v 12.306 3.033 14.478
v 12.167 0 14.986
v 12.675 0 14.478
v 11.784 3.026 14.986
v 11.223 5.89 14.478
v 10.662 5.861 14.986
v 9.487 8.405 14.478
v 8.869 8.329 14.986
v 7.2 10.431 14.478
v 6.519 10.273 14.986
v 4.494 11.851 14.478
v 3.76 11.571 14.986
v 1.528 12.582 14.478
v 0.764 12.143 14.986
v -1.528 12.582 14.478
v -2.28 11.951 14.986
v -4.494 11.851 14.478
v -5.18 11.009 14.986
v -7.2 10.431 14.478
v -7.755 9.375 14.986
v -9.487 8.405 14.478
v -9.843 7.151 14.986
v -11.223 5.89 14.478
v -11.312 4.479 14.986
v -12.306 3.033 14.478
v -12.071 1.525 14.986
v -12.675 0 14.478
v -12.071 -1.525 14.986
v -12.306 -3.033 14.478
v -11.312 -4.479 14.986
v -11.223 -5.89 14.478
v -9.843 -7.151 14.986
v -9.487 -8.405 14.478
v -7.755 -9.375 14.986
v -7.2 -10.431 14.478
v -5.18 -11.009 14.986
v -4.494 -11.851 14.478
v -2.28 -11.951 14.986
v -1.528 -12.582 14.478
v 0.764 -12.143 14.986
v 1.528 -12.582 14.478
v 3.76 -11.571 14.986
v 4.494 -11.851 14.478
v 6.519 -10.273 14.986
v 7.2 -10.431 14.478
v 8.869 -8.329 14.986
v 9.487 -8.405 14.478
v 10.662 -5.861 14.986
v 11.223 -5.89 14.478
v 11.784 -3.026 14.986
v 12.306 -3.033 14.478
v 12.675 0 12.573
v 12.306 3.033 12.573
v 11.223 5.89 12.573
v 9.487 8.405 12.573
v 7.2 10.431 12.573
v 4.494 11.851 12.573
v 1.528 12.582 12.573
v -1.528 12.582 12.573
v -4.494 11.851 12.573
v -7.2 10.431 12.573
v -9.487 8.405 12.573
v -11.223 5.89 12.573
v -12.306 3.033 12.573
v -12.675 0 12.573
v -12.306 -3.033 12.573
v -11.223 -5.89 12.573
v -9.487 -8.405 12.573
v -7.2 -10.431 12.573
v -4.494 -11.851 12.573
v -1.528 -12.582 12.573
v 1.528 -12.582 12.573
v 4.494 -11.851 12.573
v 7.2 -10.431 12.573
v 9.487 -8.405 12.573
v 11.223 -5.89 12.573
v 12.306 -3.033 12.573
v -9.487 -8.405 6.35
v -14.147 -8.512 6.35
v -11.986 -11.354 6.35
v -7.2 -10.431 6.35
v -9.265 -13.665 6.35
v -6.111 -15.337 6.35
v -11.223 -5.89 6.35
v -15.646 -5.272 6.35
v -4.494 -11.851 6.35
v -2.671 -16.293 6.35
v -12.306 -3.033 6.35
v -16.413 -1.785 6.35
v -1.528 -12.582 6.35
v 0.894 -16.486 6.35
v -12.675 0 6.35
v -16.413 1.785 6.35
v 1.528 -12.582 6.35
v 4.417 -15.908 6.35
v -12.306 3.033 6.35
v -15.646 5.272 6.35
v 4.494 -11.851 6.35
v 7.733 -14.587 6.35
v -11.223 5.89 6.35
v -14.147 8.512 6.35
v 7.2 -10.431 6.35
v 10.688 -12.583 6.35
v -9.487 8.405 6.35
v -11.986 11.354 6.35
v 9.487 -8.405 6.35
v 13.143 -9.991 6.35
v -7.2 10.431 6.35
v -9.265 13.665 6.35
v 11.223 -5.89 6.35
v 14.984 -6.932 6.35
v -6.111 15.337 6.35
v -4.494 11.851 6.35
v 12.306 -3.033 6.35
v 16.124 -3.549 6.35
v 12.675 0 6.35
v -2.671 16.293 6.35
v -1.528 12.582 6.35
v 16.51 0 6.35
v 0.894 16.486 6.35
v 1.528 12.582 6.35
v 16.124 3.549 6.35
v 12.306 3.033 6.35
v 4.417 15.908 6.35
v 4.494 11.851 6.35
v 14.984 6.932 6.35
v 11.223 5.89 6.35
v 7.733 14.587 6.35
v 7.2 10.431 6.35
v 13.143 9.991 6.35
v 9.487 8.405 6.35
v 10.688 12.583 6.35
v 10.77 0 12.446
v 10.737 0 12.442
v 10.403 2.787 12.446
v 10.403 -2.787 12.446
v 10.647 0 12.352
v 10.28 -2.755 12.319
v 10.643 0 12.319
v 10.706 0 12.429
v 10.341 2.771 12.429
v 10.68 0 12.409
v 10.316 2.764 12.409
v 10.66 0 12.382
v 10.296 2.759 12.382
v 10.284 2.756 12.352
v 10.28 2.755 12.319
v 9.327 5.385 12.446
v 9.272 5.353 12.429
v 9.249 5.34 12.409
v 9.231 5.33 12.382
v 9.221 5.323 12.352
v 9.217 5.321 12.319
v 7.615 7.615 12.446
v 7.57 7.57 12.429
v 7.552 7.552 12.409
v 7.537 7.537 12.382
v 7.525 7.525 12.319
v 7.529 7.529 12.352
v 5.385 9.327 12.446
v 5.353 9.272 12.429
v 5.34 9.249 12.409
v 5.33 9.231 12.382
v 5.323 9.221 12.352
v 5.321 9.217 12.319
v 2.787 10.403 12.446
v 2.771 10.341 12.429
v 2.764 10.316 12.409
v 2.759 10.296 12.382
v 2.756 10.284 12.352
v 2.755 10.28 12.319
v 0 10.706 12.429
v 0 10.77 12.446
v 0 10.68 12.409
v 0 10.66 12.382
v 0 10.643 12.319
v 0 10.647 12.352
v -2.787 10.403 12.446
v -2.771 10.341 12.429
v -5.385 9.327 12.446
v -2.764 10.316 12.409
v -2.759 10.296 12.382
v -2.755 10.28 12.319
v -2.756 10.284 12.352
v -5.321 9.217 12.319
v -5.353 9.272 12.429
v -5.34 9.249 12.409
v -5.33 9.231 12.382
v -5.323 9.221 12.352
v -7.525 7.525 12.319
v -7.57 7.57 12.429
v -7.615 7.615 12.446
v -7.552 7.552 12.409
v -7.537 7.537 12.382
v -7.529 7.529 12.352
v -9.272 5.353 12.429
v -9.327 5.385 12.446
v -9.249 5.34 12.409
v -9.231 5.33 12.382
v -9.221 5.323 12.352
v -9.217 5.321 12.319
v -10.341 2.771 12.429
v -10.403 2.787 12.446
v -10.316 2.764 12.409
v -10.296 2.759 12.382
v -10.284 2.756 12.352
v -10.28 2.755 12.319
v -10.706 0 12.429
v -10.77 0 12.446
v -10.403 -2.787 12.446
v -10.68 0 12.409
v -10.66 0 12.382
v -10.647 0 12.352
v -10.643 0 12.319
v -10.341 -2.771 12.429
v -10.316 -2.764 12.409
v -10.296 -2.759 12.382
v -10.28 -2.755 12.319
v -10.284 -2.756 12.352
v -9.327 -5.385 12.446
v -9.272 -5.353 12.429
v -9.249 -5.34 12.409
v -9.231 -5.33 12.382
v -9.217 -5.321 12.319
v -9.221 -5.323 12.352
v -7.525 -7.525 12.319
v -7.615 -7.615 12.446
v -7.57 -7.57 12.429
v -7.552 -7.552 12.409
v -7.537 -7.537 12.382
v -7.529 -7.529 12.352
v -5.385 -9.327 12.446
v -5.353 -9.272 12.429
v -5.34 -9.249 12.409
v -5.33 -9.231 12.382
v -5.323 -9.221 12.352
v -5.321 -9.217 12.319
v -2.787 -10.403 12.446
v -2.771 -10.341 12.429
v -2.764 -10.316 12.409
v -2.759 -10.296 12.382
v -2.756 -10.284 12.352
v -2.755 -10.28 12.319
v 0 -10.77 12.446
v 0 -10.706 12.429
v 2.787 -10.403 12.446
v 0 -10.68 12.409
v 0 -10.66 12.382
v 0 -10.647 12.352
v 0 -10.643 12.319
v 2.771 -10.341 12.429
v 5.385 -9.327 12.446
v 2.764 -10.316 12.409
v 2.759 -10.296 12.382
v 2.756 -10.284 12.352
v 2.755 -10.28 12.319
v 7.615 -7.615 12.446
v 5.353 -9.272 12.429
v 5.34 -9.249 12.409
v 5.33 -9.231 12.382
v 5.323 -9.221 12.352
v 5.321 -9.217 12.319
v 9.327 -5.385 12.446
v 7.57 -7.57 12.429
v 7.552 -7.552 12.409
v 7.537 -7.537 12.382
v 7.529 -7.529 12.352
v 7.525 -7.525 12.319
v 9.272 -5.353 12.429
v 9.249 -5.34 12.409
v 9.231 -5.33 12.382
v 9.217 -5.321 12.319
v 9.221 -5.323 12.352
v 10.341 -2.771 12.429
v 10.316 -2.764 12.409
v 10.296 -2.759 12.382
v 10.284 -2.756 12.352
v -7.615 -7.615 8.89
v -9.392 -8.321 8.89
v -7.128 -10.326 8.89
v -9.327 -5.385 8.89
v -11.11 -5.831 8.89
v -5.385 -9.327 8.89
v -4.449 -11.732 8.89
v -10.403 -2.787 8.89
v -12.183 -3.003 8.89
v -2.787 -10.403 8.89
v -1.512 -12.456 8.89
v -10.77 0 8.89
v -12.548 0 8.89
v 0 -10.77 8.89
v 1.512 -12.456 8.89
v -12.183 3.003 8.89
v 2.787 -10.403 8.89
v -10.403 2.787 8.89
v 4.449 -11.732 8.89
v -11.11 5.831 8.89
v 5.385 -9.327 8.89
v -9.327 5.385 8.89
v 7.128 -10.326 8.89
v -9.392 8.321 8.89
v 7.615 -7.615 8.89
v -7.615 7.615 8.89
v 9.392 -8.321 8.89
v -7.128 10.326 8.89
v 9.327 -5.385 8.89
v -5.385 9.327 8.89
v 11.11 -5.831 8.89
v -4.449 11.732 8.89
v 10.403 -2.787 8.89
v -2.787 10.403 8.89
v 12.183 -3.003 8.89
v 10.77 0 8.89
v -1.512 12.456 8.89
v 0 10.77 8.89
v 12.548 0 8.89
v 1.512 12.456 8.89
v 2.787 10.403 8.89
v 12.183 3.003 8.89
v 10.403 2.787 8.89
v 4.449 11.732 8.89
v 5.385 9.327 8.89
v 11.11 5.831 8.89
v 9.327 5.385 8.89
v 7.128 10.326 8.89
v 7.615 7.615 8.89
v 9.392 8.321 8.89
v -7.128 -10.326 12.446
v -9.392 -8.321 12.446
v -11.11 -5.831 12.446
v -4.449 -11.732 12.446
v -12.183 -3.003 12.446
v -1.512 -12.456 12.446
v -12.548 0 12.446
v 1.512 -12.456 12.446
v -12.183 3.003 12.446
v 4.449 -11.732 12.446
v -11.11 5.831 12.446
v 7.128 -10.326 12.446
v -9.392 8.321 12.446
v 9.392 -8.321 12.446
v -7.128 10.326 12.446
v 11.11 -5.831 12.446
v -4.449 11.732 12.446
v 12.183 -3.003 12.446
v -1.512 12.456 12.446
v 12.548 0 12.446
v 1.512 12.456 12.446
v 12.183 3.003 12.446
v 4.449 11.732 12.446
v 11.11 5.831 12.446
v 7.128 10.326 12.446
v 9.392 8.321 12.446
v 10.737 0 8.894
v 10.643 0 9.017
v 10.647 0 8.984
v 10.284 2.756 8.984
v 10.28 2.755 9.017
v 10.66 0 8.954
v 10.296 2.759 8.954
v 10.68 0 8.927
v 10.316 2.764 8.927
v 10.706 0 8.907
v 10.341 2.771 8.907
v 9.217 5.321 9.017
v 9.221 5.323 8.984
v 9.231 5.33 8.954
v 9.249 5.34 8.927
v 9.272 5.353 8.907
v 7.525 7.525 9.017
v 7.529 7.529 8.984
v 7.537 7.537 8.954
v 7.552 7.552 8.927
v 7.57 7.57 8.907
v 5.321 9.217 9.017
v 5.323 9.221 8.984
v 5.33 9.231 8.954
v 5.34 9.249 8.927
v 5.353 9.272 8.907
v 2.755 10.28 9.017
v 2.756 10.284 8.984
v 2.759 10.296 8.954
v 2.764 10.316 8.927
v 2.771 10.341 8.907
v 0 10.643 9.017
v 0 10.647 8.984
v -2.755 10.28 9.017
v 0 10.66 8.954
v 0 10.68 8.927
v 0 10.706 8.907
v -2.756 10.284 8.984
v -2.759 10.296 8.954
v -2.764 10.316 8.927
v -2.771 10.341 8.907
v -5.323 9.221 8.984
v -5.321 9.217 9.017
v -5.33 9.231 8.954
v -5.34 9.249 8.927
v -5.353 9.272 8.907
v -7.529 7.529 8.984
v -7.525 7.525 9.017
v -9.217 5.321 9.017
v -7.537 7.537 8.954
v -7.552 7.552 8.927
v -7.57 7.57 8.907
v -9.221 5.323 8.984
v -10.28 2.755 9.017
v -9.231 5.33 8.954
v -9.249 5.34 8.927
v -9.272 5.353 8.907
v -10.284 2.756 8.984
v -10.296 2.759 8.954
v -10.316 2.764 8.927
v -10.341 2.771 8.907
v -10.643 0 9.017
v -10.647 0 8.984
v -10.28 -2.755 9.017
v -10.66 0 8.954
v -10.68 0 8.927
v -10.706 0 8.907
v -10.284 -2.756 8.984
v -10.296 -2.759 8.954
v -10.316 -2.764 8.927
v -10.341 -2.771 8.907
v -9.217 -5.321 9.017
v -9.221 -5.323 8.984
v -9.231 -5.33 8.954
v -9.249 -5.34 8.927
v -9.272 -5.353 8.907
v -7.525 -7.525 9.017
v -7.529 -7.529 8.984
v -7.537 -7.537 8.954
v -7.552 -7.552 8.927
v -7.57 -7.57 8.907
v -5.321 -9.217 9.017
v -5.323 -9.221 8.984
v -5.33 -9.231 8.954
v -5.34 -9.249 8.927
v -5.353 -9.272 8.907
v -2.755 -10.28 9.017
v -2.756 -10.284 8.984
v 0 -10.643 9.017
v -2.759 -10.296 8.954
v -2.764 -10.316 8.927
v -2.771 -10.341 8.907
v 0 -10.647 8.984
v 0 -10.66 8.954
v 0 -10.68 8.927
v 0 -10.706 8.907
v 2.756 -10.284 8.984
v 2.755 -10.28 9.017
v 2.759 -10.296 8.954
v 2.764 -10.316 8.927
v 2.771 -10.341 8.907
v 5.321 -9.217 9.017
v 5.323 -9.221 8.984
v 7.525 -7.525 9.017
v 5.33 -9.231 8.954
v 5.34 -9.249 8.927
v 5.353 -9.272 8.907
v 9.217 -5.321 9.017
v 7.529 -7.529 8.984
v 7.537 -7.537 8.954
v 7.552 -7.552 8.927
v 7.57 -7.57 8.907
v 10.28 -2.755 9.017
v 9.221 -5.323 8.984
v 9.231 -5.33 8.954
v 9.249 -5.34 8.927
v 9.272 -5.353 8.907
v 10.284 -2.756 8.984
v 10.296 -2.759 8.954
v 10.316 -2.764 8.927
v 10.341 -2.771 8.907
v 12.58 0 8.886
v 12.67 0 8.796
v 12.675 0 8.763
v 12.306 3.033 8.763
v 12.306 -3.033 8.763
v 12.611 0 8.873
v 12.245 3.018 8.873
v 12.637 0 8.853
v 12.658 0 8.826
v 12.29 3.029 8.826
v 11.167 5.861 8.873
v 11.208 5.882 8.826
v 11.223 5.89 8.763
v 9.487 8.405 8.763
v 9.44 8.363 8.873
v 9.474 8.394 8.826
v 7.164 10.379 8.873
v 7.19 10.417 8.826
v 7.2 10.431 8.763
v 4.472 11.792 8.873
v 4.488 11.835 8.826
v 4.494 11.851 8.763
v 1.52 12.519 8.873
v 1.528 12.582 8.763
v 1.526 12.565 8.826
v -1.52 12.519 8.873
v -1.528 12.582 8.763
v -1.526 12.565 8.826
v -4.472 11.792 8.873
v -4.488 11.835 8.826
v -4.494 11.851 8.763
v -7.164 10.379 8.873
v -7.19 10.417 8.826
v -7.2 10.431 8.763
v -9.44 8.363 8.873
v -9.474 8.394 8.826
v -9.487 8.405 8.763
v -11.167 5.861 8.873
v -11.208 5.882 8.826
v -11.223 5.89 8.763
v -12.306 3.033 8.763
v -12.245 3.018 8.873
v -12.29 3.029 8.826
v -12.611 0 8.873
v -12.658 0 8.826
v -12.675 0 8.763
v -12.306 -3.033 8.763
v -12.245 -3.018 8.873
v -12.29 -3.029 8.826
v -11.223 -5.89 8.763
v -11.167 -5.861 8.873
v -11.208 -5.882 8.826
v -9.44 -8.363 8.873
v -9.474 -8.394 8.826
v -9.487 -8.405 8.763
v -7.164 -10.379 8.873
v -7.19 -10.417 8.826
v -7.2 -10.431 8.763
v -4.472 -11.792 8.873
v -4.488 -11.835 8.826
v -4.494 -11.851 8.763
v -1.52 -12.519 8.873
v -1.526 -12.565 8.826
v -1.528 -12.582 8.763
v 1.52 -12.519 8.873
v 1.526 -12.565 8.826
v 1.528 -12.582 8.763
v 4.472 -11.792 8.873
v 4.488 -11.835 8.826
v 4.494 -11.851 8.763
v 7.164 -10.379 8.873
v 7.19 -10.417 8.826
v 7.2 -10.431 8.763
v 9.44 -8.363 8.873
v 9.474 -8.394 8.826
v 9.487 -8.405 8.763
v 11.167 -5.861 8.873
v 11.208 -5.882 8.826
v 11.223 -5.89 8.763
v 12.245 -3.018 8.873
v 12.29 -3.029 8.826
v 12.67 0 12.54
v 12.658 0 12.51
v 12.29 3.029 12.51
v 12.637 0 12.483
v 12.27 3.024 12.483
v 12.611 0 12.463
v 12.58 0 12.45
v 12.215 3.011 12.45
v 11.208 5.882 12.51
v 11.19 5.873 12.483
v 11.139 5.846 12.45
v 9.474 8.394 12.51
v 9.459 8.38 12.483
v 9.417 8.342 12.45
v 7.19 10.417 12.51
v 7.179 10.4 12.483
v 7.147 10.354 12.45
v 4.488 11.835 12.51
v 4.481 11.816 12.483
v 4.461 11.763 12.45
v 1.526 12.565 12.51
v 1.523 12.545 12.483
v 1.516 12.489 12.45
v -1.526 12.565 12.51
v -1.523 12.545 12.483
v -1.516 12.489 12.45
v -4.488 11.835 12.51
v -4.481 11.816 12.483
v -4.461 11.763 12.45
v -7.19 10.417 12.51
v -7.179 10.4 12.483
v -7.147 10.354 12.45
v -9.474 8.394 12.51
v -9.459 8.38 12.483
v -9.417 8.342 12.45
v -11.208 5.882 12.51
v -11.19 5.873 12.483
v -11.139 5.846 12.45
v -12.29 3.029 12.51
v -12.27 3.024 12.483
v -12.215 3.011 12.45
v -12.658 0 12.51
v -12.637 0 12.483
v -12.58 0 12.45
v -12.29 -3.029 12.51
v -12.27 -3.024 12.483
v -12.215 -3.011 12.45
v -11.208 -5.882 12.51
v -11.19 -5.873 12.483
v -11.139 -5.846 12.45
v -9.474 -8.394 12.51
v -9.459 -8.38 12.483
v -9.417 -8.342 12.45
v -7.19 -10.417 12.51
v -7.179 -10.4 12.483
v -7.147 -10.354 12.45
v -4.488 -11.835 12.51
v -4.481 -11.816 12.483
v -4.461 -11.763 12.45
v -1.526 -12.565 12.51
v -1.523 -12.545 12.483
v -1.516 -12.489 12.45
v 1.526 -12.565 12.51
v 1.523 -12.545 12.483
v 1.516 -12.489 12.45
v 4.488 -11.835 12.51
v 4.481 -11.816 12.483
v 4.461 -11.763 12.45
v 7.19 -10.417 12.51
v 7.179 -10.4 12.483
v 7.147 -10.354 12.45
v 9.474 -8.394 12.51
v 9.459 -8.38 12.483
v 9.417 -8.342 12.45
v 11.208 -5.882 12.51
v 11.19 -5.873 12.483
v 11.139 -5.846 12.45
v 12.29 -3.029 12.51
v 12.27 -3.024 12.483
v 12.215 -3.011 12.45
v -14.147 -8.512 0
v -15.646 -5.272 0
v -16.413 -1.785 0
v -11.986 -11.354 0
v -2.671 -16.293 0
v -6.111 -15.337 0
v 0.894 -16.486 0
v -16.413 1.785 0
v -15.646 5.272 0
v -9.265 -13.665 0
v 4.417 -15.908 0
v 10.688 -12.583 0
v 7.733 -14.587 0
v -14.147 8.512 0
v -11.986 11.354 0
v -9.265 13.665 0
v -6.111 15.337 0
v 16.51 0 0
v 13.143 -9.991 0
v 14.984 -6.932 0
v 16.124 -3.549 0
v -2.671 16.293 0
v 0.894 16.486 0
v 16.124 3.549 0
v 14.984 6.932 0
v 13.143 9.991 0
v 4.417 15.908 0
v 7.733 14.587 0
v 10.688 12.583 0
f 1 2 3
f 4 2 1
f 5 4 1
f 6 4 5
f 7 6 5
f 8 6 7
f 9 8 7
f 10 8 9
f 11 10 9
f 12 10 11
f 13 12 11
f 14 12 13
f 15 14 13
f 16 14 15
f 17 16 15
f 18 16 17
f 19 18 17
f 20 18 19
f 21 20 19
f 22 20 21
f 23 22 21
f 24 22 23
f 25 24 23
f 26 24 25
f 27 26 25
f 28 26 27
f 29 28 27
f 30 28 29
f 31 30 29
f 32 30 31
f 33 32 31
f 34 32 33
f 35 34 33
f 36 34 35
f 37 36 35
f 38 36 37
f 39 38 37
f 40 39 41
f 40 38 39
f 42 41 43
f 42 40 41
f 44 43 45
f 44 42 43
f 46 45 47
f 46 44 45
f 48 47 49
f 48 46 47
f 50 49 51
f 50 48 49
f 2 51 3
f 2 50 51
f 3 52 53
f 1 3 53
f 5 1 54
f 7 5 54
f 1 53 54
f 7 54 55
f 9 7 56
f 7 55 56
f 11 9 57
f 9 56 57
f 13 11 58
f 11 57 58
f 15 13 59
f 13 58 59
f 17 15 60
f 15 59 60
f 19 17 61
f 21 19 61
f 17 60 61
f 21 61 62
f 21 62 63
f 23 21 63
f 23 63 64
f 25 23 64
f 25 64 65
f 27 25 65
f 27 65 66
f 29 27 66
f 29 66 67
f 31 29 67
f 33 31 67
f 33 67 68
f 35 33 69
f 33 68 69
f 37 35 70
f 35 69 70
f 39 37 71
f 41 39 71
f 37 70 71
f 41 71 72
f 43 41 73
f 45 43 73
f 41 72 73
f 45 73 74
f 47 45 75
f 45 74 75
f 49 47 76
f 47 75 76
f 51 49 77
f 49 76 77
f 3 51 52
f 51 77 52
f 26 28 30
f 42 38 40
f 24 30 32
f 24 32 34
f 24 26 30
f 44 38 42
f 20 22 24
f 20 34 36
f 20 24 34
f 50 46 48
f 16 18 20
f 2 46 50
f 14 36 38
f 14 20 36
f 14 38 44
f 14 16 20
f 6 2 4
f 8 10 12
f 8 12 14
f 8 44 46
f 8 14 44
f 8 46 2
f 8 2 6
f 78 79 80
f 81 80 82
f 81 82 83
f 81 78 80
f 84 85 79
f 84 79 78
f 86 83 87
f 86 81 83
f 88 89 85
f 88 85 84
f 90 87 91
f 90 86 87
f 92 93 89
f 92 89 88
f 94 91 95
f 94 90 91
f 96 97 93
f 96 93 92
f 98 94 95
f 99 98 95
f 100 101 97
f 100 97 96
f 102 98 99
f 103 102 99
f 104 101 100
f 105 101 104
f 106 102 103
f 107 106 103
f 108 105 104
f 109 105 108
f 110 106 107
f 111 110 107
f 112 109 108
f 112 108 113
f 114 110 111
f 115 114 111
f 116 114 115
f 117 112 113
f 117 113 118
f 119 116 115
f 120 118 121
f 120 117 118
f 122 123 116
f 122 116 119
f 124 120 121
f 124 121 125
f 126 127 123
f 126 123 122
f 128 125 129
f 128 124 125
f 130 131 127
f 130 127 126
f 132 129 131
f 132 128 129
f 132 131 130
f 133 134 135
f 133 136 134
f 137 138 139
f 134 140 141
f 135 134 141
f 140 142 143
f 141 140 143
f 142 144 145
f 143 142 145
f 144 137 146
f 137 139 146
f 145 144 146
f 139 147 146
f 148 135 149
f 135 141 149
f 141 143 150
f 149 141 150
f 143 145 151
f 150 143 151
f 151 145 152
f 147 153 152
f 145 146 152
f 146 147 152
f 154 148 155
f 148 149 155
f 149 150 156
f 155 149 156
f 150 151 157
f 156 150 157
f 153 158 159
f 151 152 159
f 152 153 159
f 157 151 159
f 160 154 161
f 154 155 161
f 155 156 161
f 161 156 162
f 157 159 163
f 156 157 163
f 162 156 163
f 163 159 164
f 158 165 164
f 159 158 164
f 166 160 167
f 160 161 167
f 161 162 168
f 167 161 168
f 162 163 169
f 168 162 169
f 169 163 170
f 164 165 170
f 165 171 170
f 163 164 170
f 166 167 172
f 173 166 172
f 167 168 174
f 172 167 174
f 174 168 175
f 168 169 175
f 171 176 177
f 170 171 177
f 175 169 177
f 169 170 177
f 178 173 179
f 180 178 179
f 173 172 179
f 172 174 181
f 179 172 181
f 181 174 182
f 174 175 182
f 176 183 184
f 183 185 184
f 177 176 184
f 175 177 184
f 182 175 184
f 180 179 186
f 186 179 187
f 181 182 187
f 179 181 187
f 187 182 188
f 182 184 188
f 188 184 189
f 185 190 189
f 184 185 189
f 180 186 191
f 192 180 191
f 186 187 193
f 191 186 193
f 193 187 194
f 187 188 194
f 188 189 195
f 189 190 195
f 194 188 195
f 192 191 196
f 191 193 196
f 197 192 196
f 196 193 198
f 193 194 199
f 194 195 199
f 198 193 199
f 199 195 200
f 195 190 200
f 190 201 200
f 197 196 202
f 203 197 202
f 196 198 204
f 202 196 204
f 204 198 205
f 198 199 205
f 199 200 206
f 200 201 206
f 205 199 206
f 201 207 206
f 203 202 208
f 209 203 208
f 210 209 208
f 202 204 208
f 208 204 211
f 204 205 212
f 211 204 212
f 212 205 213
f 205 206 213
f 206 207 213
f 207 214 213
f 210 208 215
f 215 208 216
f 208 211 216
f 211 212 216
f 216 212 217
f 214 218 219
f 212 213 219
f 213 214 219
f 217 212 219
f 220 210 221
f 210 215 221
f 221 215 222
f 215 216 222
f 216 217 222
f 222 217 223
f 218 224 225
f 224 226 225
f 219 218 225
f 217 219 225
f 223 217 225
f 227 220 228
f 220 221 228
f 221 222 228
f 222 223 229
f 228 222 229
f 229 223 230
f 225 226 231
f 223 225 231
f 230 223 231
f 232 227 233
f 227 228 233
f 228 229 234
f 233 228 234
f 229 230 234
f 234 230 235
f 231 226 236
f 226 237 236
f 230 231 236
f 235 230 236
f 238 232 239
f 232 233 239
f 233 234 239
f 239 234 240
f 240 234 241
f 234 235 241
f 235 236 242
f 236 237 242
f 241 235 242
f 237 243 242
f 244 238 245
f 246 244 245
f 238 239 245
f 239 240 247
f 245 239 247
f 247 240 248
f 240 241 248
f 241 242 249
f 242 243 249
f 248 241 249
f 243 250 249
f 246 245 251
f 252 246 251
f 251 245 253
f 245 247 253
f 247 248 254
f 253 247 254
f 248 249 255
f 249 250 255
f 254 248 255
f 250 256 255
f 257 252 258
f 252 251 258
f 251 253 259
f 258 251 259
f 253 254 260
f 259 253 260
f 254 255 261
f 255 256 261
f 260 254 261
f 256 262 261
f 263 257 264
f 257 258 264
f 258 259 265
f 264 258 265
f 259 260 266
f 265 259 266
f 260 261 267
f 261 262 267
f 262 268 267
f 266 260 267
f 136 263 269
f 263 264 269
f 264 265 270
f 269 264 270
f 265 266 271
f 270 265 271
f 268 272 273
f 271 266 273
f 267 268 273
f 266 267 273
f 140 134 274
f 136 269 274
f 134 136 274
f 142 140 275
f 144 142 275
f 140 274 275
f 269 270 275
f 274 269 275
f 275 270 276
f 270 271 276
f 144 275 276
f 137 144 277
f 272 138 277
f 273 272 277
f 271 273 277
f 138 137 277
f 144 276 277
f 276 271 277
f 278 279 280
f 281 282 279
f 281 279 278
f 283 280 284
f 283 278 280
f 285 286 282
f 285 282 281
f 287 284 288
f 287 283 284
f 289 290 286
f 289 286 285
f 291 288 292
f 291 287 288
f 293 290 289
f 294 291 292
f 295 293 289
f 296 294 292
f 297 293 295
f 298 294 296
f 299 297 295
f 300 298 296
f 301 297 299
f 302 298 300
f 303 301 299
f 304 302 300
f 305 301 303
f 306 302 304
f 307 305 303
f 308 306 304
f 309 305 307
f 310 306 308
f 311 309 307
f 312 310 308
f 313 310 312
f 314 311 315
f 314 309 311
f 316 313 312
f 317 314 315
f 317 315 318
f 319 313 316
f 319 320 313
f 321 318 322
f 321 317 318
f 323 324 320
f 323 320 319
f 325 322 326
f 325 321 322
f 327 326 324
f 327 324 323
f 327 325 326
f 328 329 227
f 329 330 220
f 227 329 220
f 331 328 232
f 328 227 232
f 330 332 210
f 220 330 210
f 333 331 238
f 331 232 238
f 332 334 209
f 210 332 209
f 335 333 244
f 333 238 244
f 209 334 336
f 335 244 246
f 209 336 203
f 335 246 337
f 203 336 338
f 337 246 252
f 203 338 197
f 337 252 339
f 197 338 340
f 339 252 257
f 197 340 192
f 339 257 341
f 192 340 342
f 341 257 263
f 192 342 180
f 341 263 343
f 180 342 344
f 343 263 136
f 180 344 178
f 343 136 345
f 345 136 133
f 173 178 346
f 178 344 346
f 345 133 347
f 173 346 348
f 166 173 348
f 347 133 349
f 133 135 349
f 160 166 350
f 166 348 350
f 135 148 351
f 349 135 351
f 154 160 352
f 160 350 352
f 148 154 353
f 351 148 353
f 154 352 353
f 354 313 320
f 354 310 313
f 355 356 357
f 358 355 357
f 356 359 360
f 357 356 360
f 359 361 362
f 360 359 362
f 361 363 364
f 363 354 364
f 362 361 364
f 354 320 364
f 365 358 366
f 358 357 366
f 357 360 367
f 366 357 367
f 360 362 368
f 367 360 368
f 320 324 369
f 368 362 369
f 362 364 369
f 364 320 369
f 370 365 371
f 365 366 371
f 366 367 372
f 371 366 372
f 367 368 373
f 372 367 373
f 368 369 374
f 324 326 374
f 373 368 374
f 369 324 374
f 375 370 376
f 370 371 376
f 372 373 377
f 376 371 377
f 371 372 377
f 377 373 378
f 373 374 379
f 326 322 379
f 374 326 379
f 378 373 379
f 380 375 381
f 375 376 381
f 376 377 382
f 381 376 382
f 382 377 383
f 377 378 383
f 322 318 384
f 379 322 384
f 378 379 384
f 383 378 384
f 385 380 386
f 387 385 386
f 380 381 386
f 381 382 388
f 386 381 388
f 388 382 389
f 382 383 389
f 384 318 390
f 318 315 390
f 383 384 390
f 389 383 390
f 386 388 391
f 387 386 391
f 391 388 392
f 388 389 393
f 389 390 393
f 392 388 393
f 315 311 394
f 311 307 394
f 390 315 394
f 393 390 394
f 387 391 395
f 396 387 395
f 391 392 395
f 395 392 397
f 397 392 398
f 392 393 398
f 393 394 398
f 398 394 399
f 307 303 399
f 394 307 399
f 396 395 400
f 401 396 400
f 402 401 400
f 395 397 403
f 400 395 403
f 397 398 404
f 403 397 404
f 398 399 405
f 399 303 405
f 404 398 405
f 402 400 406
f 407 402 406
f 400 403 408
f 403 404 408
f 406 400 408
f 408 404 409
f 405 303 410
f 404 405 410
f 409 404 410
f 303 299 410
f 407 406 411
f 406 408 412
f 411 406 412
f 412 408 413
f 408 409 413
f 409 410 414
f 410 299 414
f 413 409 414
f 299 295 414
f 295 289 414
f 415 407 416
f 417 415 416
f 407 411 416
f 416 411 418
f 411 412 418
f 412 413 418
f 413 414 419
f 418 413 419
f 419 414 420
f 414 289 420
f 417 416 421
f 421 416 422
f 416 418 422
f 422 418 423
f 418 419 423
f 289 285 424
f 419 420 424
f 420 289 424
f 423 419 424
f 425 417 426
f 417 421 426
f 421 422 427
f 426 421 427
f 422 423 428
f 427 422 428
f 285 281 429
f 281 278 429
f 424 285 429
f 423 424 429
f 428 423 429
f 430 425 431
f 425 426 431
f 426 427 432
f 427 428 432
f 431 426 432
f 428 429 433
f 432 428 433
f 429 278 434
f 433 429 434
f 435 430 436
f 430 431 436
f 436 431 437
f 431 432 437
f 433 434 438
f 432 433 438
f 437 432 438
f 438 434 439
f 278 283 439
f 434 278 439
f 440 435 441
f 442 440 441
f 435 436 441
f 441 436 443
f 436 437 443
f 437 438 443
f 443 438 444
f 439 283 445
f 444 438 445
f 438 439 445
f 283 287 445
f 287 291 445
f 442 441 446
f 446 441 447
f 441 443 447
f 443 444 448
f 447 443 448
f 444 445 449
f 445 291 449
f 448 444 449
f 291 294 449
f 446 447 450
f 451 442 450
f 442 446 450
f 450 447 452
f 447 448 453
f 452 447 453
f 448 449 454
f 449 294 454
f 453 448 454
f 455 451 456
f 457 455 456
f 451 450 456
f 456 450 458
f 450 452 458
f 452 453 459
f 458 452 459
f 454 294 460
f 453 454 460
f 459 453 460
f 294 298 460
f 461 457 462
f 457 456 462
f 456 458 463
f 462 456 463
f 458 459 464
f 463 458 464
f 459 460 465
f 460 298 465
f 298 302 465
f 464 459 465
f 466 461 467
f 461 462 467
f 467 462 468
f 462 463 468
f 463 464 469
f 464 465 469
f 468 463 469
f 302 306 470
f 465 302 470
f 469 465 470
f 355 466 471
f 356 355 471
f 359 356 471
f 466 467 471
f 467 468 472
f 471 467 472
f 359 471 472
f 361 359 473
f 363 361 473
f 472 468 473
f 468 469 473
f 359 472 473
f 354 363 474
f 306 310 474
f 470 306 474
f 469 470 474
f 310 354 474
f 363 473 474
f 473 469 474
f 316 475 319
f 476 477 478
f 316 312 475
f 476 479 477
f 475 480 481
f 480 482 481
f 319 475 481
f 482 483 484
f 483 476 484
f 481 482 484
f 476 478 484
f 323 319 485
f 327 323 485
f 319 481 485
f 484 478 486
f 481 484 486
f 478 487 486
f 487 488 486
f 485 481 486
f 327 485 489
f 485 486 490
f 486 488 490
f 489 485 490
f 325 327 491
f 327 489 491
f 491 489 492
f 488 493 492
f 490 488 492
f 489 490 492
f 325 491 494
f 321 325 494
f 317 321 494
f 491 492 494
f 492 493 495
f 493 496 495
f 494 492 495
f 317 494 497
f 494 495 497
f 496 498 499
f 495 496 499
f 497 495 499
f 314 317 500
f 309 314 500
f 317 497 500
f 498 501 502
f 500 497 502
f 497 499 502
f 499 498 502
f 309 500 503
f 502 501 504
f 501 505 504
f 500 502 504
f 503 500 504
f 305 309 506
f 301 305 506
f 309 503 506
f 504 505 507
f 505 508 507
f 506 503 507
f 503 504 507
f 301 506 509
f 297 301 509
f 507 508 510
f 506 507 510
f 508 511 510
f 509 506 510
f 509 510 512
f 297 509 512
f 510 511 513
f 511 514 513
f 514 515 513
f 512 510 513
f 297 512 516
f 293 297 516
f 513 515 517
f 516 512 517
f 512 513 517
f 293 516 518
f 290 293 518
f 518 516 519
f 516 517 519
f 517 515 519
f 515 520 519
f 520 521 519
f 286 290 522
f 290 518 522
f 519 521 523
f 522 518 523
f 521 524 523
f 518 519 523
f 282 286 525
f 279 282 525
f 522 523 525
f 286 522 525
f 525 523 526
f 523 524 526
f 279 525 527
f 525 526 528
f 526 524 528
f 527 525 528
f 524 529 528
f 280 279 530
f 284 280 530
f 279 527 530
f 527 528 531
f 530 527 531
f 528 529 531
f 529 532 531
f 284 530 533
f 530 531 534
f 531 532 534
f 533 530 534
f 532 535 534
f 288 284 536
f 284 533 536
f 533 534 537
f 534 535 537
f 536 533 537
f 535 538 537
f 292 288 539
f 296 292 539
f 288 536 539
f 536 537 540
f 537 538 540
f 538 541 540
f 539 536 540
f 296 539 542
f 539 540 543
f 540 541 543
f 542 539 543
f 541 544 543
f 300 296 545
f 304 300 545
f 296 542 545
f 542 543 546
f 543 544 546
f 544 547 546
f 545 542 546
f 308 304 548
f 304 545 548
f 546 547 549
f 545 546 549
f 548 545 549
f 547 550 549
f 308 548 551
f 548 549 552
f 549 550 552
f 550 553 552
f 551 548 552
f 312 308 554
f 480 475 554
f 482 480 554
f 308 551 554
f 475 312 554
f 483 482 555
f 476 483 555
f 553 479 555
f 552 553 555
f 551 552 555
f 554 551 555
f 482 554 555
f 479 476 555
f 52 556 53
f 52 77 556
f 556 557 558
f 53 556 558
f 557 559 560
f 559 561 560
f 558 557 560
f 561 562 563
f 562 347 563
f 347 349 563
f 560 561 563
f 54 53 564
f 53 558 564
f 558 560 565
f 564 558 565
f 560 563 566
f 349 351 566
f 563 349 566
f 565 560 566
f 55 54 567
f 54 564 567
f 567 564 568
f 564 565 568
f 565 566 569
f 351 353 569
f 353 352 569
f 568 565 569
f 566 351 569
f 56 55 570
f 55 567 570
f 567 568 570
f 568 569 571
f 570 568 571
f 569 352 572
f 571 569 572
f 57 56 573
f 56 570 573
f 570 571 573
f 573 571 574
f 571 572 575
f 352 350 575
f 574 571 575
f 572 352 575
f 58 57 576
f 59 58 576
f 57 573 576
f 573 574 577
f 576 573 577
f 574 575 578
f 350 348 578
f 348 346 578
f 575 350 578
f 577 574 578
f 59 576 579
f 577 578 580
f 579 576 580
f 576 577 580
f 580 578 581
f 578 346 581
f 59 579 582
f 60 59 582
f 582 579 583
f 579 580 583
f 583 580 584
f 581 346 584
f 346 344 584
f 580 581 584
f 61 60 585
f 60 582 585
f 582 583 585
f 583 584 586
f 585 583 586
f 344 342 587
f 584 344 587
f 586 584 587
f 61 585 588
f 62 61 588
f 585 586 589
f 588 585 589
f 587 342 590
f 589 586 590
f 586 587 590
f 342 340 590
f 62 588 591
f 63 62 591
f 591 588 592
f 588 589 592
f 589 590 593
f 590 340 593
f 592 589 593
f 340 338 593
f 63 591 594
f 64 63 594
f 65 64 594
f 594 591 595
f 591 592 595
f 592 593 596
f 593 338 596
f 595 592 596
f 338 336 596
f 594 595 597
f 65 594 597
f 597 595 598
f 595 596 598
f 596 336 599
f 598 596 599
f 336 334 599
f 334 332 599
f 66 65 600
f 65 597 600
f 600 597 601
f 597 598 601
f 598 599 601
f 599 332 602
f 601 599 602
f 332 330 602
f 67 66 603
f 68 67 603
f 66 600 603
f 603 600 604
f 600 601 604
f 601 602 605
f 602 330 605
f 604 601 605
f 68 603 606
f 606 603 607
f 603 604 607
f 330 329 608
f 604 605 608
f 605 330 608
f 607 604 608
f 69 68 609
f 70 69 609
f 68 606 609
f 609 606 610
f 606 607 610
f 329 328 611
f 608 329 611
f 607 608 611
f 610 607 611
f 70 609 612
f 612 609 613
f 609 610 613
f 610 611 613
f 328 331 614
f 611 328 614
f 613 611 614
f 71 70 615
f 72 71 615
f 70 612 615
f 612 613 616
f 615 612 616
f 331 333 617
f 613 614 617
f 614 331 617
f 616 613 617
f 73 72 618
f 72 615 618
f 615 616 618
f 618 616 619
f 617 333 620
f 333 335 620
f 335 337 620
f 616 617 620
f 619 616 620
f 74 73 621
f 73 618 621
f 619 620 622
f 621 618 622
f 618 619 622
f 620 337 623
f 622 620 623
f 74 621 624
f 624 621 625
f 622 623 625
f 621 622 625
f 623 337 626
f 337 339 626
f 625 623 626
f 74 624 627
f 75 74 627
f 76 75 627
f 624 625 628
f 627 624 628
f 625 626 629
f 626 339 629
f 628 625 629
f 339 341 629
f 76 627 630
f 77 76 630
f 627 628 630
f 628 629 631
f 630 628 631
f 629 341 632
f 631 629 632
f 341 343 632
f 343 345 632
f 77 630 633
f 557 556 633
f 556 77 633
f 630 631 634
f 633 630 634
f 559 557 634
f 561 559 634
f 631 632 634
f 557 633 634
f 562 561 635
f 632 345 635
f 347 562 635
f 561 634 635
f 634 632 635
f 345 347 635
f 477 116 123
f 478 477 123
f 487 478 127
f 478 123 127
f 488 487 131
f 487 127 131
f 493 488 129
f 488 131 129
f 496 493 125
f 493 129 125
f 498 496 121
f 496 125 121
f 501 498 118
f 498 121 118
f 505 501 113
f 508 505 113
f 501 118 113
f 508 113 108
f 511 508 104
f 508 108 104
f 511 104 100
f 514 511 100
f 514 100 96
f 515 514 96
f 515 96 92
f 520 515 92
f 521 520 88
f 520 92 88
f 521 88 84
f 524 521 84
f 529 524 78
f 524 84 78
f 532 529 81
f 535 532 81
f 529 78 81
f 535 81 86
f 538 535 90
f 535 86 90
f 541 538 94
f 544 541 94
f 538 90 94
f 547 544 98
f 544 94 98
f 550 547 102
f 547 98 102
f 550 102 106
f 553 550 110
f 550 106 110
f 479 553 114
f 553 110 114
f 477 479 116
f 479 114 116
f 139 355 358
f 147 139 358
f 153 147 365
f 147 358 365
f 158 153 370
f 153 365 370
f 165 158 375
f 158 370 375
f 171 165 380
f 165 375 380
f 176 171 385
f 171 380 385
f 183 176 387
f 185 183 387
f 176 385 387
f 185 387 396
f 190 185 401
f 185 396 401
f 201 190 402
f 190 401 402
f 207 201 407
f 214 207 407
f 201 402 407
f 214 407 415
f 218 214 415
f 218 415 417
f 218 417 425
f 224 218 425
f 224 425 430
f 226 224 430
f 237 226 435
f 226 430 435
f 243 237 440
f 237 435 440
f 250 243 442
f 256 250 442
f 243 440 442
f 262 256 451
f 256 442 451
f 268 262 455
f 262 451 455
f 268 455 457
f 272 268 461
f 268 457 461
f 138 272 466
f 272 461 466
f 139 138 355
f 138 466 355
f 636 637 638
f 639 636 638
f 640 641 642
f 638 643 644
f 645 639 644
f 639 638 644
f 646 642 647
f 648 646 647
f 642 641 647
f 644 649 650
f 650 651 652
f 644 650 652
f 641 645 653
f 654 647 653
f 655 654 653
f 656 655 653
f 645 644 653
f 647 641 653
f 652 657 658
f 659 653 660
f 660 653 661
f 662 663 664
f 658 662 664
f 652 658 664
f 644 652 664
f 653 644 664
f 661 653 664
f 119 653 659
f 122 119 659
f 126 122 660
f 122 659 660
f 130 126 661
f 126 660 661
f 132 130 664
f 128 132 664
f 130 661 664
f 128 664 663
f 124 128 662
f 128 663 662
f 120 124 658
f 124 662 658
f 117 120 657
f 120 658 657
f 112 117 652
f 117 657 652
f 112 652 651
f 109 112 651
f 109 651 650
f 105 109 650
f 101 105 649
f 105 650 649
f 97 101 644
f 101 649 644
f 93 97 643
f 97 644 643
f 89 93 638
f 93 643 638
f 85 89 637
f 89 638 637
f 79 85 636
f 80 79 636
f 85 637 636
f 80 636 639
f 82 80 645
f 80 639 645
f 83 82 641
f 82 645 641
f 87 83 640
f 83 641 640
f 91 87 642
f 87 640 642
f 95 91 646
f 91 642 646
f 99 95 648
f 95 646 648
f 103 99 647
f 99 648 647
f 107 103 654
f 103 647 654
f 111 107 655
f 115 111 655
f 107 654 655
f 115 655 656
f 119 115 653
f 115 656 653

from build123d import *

# Parameters (mm, degrees)
F0_R     = 16.51
F1_DEPTH = 6.35
F2_R     = 12.6746
F3_DEPTH = 2.54
F4_R     = 10.6426
F5_DEPTH = 3.556
F6_R     = 12.6746
F7_DEPTH = 2.54
F8_R     = 0.127
F9_SIZE  = 0.508


with BuildPart() as f1:
    # F0 (on Top) → F1 (new body)
    with BuildSketch(Plane.XY):
        Circle(F0_R)
    extrude(amount=F1_DEPTH)

    # F2 (on face) → F3 (join)
    with BuildSketch(Plane.XY.offset(6.35)):
        Circle(F2_R)
    extrude(amount=F3_DEPTH)

    # F4 (on face) → F5 (join)
    with BuildSketch(Plane.XY.offset(8.89)):
        Circle(F4_R)
    extrude(amount=F5_DEPTH)

    # F6 (on face) → F7 (join)
    with BuildSketch(Plane.XY.offset(12.446)):
        Circle(F6_R)
    extrude(amount=F7_DEPTH)

    # F8
    f8_edges = [f1.edges().sort_by_distance(p)[0] for p in [
        (-10.6426, 0, 8.89),
        (-12.6746, 0, 8.89),
        (-12.6746, 0, 12.446),
        (-10.6426, 0, 12.446),
    ]]
    fillet(f8_edges, radius=F8_R)

    # F9
    f9_edges = [f1.edges().sort_by_distance(p)[0] for p in [
        (-12.6746, 0, 14.986),
    ]]
    chamfer(f9_edges, length=F9_SIZE)


solid = f1.part
